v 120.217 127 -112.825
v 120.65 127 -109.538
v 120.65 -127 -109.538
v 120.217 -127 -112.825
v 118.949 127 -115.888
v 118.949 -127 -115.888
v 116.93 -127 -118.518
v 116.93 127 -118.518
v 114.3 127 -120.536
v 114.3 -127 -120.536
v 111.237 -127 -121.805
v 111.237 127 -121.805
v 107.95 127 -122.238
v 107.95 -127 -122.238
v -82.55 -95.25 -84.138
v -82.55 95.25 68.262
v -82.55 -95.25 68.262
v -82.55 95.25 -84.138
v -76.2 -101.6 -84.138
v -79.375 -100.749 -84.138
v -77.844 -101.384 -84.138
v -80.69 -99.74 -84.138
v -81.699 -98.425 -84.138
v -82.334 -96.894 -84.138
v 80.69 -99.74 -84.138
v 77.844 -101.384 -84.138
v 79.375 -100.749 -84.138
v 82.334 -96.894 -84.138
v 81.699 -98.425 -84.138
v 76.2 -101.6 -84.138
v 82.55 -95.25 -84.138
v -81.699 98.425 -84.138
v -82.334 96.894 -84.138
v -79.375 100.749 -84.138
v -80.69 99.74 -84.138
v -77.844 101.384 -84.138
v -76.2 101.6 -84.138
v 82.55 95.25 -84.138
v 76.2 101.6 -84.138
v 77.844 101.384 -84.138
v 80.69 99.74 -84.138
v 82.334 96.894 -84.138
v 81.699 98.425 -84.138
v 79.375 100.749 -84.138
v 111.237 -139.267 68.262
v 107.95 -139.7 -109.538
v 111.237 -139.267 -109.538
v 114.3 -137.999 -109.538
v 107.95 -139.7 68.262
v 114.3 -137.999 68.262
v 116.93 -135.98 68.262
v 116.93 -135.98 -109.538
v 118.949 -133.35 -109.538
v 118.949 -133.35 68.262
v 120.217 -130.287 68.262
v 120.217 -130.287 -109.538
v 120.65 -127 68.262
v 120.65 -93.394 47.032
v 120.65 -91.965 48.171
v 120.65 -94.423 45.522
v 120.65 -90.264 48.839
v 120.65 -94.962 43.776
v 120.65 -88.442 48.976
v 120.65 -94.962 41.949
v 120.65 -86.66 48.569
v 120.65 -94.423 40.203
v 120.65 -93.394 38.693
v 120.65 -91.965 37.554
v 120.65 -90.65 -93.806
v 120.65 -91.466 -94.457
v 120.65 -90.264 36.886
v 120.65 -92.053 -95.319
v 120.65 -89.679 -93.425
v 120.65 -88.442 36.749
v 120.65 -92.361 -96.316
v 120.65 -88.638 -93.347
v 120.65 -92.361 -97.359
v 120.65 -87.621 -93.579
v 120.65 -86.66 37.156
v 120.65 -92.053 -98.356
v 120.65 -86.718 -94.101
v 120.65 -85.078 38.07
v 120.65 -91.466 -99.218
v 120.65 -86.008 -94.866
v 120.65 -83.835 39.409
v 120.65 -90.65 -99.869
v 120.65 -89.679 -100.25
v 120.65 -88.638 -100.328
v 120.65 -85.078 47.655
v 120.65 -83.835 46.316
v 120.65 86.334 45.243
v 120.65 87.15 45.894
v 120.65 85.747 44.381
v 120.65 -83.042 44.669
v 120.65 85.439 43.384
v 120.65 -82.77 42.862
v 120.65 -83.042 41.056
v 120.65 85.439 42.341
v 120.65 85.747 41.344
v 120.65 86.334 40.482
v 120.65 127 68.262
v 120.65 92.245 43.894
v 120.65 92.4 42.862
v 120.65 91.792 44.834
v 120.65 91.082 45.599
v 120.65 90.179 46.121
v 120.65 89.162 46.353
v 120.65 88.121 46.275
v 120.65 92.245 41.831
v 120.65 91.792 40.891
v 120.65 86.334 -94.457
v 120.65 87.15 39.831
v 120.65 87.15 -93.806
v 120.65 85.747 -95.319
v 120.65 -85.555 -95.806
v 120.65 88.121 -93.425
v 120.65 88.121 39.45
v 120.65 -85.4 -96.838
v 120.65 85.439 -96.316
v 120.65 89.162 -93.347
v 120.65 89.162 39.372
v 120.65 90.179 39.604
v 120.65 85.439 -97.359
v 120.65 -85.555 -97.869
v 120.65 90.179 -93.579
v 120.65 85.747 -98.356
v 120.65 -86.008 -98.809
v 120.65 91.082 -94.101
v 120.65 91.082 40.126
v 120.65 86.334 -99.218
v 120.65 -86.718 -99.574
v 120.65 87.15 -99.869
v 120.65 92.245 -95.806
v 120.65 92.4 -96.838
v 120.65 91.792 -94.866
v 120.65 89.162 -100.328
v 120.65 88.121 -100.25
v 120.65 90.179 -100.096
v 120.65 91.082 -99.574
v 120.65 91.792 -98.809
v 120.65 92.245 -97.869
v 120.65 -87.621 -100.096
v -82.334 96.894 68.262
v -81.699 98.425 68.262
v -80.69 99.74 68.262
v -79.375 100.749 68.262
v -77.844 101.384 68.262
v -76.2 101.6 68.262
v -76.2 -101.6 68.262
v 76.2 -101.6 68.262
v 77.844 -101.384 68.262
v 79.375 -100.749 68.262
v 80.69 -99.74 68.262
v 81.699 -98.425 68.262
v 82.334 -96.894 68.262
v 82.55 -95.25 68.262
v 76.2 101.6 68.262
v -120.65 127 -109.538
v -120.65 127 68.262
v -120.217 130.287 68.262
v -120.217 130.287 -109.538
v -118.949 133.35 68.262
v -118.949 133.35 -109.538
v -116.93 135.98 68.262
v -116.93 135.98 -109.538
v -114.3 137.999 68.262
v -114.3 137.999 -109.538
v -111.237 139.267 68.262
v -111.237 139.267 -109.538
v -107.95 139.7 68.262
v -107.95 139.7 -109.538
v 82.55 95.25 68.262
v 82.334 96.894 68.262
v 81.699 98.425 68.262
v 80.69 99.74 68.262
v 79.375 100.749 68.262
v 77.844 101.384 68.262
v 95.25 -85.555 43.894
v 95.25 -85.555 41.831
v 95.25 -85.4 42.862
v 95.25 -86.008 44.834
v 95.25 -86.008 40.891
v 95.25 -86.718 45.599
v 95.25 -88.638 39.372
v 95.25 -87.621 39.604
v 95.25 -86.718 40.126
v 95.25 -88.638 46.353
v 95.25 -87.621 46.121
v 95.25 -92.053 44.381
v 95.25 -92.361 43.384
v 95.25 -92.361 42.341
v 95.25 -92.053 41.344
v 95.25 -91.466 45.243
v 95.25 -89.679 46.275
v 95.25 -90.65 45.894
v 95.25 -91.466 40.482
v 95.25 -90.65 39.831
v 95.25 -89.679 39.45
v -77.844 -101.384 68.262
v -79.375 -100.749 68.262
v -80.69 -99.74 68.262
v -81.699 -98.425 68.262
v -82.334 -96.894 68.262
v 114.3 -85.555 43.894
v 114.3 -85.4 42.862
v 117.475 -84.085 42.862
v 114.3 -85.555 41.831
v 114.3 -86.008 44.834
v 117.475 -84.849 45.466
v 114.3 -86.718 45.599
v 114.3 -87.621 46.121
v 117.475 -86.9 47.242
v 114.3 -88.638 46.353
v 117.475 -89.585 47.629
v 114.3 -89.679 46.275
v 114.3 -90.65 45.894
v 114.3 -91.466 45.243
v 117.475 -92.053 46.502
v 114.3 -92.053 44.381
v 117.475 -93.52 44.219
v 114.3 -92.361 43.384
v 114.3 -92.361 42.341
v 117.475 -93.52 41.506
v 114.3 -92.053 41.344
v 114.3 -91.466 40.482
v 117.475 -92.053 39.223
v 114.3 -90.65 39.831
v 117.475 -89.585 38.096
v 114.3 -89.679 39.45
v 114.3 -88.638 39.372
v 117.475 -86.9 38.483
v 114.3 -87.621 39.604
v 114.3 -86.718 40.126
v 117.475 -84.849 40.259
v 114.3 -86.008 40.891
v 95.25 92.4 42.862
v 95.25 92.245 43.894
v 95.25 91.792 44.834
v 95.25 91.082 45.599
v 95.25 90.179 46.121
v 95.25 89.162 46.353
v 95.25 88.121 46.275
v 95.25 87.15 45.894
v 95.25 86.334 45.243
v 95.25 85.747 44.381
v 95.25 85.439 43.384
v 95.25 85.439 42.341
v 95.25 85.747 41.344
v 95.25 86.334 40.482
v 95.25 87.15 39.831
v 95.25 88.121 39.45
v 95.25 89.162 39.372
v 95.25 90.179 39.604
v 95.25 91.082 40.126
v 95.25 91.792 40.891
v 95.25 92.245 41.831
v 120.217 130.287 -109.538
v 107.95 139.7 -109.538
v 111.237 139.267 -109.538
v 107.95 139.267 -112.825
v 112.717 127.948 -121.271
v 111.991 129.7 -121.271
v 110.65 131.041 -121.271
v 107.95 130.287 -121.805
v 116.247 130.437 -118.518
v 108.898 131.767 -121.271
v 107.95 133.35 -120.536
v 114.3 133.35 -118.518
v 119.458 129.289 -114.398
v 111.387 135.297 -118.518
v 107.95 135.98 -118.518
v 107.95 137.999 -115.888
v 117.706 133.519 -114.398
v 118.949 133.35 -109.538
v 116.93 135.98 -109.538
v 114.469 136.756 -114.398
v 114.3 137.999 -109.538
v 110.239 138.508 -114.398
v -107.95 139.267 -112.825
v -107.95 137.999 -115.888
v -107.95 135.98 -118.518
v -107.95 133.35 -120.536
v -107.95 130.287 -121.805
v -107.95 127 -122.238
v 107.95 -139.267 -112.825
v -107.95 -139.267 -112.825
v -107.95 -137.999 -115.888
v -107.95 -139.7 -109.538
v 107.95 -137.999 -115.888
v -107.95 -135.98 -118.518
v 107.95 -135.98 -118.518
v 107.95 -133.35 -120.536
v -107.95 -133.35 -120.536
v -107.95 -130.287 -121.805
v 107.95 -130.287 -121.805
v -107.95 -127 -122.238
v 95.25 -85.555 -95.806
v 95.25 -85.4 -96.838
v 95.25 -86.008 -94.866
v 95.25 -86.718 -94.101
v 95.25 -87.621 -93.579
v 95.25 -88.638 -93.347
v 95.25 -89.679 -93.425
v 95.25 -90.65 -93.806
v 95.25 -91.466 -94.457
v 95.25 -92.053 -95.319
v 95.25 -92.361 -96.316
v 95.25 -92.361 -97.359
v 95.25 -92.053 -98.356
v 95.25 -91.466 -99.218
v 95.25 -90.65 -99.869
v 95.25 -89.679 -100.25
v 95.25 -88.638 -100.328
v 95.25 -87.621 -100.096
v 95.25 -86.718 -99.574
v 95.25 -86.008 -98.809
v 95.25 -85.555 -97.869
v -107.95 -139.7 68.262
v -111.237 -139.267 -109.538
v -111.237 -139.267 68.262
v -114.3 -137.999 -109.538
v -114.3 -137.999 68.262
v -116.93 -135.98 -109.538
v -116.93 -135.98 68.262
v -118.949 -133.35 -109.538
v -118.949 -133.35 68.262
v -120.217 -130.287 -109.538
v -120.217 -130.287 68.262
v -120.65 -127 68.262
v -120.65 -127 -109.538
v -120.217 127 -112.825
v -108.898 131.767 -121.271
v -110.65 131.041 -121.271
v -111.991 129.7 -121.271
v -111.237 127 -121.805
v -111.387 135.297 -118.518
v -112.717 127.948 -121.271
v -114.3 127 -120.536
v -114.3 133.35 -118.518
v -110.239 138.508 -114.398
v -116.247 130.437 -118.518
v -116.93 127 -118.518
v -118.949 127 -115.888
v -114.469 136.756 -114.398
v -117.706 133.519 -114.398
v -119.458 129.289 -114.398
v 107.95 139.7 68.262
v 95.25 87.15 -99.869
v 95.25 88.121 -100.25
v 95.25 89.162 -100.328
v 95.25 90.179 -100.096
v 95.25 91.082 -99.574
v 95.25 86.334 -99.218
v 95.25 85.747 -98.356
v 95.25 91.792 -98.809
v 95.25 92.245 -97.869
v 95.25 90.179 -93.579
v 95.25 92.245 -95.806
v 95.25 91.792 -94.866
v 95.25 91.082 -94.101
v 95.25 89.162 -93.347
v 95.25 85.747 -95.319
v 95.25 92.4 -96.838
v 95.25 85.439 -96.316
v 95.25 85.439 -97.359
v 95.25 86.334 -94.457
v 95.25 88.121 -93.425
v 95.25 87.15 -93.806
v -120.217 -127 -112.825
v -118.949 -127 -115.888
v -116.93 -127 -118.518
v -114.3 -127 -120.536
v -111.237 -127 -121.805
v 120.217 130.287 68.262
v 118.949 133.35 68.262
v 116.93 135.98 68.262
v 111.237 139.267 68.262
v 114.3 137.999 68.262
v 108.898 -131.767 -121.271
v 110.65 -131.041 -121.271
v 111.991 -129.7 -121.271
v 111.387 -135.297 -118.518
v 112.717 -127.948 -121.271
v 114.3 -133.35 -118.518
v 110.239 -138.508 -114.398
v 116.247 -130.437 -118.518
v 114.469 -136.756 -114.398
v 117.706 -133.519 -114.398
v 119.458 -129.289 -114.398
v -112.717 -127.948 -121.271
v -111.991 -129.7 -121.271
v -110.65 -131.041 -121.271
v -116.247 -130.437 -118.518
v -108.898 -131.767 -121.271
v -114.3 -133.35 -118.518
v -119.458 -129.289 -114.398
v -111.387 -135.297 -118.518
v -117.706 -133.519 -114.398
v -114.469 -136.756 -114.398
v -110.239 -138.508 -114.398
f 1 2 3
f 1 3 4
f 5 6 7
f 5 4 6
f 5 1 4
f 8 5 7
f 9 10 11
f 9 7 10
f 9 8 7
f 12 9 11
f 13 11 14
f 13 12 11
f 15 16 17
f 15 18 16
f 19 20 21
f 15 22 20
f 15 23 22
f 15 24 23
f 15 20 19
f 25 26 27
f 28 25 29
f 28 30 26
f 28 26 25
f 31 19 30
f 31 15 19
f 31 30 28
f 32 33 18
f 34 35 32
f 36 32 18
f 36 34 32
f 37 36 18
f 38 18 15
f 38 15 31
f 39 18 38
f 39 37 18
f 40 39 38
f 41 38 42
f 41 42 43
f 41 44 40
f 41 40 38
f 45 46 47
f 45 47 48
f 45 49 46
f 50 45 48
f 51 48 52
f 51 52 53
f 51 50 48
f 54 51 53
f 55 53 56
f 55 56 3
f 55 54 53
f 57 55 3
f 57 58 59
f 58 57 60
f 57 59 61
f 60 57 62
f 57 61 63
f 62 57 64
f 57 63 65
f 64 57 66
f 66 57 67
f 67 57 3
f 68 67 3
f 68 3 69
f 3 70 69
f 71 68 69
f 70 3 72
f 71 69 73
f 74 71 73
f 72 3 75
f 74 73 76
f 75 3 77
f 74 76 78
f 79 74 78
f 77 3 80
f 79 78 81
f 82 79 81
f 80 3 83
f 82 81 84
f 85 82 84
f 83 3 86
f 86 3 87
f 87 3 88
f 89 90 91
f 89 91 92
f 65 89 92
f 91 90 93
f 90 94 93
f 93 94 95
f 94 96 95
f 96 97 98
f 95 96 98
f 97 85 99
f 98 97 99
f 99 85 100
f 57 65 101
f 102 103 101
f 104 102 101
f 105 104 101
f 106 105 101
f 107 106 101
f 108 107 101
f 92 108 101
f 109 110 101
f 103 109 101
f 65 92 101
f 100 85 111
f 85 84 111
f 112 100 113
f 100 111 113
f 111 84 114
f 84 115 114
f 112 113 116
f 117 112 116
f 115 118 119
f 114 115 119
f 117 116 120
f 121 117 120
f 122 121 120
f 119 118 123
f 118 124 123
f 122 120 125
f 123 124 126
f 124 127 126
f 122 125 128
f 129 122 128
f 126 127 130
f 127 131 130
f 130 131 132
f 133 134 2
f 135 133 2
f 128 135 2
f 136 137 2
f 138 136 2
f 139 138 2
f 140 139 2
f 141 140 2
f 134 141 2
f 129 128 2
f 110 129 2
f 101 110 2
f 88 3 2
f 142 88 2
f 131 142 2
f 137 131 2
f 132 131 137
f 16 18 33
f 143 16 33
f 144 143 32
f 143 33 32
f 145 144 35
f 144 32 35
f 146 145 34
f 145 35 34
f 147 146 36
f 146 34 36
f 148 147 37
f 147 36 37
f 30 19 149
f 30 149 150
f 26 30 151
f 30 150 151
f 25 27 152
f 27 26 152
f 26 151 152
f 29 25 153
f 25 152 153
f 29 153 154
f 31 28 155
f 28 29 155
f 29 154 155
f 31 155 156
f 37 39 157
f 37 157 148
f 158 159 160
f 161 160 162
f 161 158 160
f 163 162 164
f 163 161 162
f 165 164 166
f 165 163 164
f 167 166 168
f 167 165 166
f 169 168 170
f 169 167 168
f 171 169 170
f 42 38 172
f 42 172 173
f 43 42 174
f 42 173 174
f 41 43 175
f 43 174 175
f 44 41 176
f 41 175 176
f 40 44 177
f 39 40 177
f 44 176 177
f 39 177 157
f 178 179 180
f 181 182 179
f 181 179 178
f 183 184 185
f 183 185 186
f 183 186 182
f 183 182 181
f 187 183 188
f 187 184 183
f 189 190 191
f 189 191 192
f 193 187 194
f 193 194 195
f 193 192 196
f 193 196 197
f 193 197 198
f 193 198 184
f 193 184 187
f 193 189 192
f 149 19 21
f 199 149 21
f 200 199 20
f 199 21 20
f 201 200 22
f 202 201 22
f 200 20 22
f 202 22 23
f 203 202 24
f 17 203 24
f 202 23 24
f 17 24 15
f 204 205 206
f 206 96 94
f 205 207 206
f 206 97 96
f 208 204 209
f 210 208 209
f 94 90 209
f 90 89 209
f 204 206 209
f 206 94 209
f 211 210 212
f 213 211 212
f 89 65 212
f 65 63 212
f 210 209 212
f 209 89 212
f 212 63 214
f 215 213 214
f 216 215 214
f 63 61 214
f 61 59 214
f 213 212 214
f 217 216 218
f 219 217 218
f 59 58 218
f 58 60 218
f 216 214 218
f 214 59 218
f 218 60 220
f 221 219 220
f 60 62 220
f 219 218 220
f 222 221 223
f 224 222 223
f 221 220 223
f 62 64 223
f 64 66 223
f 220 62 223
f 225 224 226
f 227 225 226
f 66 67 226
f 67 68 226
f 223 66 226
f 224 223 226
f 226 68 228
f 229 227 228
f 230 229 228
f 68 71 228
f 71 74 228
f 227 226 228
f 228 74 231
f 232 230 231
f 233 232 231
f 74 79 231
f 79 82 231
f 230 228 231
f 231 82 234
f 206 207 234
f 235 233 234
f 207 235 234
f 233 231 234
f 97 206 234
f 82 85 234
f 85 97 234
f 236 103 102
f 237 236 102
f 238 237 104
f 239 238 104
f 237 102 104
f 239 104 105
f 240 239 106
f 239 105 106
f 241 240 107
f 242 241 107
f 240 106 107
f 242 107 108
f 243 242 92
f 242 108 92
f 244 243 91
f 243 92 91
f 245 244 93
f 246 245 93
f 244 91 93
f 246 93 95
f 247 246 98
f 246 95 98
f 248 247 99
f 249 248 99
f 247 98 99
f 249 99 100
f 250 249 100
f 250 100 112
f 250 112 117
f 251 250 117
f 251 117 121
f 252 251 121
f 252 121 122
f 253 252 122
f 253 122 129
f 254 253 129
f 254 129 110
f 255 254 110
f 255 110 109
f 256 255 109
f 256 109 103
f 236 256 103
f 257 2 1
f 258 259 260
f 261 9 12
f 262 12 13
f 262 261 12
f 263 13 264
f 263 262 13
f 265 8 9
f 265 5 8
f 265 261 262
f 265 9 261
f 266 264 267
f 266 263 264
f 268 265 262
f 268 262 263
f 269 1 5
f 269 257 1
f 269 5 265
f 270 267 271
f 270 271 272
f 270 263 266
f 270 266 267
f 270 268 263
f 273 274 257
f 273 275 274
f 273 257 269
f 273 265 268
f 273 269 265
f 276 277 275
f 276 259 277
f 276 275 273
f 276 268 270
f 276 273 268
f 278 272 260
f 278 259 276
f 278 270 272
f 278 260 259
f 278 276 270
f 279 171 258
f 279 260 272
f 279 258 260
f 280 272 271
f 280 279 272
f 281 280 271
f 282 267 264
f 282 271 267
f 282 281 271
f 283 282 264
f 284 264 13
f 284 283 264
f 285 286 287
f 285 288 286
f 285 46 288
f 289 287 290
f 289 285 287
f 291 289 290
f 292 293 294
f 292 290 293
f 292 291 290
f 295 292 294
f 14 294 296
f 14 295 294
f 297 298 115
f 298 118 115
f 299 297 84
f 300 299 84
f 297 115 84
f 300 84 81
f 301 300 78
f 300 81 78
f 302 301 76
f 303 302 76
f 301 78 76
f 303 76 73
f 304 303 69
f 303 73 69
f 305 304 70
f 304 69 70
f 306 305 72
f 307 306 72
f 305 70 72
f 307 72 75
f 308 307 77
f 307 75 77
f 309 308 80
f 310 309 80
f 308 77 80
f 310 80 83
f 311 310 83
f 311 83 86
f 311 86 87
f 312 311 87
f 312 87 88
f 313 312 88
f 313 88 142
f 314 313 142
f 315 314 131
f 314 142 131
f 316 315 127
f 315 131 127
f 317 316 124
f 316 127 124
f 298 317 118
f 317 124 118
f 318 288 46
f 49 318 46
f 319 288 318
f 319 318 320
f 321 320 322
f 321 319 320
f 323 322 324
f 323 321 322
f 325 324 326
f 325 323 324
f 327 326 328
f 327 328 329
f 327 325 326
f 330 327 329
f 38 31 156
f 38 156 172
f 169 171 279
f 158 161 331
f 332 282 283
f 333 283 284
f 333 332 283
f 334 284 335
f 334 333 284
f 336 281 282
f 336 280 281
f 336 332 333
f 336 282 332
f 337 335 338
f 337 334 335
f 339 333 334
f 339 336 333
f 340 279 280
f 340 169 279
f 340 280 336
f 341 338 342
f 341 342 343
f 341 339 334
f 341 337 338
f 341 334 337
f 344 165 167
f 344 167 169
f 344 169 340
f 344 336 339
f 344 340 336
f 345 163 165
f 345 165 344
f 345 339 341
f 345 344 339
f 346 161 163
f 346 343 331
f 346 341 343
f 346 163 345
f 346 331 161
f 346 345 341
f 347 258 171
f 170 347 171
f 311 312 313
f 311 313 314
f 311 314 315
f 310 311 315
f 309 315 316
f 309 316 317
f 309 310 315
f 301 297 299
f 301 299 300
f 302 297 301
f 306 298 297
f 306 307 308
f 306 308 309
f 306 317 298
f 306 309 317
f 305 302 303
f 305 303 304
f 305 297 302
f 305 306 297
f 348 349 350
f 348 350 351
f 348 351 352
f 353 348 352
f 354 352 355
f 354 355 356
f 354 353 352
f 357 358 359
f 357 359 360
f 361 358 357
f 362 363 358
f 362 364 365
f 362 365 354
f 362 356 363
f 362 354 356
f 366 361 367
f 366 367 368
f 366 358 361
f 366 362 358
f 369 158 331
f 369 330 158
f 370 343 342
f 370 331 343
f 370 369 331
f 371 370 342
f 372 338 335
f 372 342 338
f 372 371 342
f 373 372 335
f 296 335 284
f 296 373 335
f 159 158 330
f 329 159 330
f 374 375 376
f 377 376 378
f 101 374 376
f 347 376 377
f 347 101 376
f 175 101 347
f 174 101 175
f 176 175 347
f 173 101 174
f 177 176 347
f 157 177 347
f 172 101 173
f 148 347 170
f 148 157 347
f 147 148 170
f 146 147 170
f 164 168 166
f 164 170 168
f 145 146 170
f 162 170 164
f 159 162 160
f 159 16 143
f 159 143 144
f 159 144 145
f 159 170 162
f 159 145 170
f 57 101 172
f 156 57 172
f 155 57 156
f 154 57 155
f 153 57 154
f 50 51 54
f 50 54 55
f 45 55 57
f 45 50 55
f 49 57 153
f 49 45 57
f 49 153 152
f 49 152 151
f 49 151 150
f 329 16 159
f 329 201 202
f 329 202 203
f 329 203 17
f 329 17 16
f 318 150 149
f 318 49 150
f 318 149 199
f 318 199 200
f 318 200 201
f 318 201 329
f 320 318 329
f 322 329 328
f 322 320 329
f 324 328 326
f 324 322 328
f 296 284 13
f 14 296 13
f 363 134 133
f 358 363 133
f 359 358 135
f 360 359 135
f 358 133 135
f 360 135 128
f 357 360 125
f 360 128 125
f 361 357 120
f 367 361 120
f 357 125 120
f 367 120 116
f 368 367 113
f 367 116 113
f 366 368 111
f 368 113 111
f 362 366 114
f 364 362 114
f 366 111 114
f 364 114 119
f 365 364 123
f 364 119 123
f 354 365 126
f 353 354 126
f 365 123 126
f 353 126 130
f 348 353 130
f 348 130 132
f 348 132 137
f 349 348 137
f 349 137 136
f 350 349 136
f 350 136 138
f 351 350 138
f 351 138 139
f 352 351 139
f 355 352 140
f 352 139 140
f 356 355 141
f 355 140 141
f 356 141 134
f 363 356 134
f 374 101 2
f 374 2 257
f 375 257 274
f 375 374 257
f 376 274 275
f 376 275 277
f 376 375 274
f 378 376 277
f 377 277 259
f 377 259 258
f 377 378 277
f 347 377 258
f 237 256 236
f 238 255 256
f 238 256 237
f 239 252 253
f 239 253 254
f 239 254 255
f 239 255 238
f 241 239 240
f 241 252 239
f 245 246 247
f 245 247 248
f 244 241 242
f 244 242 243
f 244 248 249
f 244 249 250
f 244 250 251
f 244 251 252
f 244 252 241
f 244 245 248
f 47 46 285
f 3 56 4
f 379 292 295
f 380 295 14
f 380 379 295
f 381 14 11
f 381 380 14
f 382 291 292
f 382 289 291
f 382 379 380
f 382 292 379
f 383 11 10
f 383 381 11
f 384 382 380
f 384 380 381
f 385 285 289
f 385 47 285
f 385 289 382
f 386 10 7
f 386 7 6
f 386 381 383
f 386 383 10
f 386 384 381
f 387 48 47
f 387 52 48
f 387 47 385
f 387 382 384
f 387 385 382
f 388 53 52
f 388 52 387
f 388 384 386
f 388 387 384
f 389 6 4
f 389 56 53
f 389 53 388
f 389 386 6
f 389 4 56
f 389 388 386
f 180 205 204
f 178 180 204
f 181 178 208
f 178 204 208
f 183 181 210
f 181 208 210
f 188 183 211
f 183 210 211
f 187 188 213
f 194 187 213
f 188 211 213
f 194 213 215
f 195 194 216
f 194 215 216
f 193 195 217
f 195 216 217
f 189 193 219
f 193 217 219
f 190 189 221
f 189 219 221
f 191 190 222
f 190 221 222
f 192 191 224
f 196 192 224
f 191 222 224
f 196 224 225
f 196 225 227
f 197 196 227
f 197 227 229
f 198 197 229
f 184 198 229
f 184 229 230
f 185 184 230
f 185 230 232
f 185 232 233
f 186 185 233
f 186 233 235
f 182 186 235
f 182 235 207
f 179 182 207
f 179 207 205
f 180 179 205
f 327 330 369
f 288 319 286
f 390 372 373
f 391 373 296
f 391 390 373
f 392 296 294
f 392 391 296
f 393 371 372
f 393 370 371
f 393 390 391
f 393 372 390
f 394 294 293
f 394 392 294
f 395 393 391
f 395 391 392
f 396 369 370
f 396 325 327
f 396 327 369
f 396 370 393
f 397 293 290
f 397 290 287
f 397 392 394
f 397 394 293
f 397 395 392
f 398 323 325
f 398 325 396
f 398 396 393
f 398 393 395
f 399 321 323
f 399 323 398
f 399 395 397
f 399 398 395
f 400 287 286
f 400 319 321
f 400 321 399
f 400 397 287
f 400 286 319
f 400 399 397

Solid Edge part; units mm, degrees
sketch "Sketch1" plane through (0, 0, 0) normal (0, 0, 1) x (1, 0, 0)
  line L0 (-120.65, -139.7) -> (120.65, -139.7)
  line L1 (120.65, -139.7) -> (120.65, 139.7)
  line L2 (120.65, 139.7) -> (-120.65, 139.7)
  line L3 (-120.65, 139.7) -> (-120.65, -139.7)
extrude "Protrusion1" add sketch "Sketch1" along normal mid plane 244.475
sketch "Sketch2" plane through (0, -139.7, 0) normal (0, -1, 0) x (1, 0, 0)
  line L0 (-120.65, 122.2375) -> (120.65, 122.2375)
  line L1 (120.65, 122.2375) -> (120.65, 68.2625)
  line L2 (120.65, 68.2625) -> (-120.65, 68.2625)
  line L3 (-120.65, 68.2625) -> (-120.65, 122.2375)
extrude "Cutout1" cut sketch "Sketch2" against normal up to vertex (279.4 mm away)
shell "Thinwall_1" thickness 38.1 removed faces 1 at (82.8463, 90.3393, 68.2625)
fillet "Round_1" radius 12.7 8 edges at (120.65, 139.7, -26.9875) (120.65, -139.7, -26.9875) (-120.65, -139.7, -26.9875) (-120.65, 139.7, -26.9875) (0, -139.7, -122.2375) (-120.65, 0, -122.2375) (120.65, 0, -122.2375) (0, 139.7, -122.2375)
fillet "Round_2" radius 6.35 4 edges at (-82.55, 101.6, -7.9375) (82.55, 101.6, -7.9375) (82.55, -101.6, -7.9375) (-82.55, -101.6, -7.9375)
sketch "Sketch3" plane through (120.65, 0, -96.8375) normal (1, 0, 0) x (0, 1, 0)
  circle A0 centre (-88.9, 139.7) radius 3.5
  circle A1 centre (88.9, 139.7) radius 3.5
  circle A2 centre (88.9, 0) radius 3.5
  circle A3 centre (-88.9, 0) radius 3.5
  dimension "D1" = 7
  dimension "D2" = 7
  dimension "D3" = 25.4
  dimension "D4" = 25.4
  dimension "D5" = 7
  dimension "D6" = 25.4
  dimension "D7" = 25.4
  dimension "D8" = 50.8
  dimension "D9" = 177.8
  dimension "D10" = 50.8
  dimension "D11" = 177.8
extrude "ExtrudedCutout_2" cut sketch "Sketch3" against normal blind 25.4
chamfer "Chamfer_1" distance 6.35 angle 22.5 1 edges at (120.65, -92.4, 42.8625) measured on face at (99.7373, -86.9631, 45.7777)
